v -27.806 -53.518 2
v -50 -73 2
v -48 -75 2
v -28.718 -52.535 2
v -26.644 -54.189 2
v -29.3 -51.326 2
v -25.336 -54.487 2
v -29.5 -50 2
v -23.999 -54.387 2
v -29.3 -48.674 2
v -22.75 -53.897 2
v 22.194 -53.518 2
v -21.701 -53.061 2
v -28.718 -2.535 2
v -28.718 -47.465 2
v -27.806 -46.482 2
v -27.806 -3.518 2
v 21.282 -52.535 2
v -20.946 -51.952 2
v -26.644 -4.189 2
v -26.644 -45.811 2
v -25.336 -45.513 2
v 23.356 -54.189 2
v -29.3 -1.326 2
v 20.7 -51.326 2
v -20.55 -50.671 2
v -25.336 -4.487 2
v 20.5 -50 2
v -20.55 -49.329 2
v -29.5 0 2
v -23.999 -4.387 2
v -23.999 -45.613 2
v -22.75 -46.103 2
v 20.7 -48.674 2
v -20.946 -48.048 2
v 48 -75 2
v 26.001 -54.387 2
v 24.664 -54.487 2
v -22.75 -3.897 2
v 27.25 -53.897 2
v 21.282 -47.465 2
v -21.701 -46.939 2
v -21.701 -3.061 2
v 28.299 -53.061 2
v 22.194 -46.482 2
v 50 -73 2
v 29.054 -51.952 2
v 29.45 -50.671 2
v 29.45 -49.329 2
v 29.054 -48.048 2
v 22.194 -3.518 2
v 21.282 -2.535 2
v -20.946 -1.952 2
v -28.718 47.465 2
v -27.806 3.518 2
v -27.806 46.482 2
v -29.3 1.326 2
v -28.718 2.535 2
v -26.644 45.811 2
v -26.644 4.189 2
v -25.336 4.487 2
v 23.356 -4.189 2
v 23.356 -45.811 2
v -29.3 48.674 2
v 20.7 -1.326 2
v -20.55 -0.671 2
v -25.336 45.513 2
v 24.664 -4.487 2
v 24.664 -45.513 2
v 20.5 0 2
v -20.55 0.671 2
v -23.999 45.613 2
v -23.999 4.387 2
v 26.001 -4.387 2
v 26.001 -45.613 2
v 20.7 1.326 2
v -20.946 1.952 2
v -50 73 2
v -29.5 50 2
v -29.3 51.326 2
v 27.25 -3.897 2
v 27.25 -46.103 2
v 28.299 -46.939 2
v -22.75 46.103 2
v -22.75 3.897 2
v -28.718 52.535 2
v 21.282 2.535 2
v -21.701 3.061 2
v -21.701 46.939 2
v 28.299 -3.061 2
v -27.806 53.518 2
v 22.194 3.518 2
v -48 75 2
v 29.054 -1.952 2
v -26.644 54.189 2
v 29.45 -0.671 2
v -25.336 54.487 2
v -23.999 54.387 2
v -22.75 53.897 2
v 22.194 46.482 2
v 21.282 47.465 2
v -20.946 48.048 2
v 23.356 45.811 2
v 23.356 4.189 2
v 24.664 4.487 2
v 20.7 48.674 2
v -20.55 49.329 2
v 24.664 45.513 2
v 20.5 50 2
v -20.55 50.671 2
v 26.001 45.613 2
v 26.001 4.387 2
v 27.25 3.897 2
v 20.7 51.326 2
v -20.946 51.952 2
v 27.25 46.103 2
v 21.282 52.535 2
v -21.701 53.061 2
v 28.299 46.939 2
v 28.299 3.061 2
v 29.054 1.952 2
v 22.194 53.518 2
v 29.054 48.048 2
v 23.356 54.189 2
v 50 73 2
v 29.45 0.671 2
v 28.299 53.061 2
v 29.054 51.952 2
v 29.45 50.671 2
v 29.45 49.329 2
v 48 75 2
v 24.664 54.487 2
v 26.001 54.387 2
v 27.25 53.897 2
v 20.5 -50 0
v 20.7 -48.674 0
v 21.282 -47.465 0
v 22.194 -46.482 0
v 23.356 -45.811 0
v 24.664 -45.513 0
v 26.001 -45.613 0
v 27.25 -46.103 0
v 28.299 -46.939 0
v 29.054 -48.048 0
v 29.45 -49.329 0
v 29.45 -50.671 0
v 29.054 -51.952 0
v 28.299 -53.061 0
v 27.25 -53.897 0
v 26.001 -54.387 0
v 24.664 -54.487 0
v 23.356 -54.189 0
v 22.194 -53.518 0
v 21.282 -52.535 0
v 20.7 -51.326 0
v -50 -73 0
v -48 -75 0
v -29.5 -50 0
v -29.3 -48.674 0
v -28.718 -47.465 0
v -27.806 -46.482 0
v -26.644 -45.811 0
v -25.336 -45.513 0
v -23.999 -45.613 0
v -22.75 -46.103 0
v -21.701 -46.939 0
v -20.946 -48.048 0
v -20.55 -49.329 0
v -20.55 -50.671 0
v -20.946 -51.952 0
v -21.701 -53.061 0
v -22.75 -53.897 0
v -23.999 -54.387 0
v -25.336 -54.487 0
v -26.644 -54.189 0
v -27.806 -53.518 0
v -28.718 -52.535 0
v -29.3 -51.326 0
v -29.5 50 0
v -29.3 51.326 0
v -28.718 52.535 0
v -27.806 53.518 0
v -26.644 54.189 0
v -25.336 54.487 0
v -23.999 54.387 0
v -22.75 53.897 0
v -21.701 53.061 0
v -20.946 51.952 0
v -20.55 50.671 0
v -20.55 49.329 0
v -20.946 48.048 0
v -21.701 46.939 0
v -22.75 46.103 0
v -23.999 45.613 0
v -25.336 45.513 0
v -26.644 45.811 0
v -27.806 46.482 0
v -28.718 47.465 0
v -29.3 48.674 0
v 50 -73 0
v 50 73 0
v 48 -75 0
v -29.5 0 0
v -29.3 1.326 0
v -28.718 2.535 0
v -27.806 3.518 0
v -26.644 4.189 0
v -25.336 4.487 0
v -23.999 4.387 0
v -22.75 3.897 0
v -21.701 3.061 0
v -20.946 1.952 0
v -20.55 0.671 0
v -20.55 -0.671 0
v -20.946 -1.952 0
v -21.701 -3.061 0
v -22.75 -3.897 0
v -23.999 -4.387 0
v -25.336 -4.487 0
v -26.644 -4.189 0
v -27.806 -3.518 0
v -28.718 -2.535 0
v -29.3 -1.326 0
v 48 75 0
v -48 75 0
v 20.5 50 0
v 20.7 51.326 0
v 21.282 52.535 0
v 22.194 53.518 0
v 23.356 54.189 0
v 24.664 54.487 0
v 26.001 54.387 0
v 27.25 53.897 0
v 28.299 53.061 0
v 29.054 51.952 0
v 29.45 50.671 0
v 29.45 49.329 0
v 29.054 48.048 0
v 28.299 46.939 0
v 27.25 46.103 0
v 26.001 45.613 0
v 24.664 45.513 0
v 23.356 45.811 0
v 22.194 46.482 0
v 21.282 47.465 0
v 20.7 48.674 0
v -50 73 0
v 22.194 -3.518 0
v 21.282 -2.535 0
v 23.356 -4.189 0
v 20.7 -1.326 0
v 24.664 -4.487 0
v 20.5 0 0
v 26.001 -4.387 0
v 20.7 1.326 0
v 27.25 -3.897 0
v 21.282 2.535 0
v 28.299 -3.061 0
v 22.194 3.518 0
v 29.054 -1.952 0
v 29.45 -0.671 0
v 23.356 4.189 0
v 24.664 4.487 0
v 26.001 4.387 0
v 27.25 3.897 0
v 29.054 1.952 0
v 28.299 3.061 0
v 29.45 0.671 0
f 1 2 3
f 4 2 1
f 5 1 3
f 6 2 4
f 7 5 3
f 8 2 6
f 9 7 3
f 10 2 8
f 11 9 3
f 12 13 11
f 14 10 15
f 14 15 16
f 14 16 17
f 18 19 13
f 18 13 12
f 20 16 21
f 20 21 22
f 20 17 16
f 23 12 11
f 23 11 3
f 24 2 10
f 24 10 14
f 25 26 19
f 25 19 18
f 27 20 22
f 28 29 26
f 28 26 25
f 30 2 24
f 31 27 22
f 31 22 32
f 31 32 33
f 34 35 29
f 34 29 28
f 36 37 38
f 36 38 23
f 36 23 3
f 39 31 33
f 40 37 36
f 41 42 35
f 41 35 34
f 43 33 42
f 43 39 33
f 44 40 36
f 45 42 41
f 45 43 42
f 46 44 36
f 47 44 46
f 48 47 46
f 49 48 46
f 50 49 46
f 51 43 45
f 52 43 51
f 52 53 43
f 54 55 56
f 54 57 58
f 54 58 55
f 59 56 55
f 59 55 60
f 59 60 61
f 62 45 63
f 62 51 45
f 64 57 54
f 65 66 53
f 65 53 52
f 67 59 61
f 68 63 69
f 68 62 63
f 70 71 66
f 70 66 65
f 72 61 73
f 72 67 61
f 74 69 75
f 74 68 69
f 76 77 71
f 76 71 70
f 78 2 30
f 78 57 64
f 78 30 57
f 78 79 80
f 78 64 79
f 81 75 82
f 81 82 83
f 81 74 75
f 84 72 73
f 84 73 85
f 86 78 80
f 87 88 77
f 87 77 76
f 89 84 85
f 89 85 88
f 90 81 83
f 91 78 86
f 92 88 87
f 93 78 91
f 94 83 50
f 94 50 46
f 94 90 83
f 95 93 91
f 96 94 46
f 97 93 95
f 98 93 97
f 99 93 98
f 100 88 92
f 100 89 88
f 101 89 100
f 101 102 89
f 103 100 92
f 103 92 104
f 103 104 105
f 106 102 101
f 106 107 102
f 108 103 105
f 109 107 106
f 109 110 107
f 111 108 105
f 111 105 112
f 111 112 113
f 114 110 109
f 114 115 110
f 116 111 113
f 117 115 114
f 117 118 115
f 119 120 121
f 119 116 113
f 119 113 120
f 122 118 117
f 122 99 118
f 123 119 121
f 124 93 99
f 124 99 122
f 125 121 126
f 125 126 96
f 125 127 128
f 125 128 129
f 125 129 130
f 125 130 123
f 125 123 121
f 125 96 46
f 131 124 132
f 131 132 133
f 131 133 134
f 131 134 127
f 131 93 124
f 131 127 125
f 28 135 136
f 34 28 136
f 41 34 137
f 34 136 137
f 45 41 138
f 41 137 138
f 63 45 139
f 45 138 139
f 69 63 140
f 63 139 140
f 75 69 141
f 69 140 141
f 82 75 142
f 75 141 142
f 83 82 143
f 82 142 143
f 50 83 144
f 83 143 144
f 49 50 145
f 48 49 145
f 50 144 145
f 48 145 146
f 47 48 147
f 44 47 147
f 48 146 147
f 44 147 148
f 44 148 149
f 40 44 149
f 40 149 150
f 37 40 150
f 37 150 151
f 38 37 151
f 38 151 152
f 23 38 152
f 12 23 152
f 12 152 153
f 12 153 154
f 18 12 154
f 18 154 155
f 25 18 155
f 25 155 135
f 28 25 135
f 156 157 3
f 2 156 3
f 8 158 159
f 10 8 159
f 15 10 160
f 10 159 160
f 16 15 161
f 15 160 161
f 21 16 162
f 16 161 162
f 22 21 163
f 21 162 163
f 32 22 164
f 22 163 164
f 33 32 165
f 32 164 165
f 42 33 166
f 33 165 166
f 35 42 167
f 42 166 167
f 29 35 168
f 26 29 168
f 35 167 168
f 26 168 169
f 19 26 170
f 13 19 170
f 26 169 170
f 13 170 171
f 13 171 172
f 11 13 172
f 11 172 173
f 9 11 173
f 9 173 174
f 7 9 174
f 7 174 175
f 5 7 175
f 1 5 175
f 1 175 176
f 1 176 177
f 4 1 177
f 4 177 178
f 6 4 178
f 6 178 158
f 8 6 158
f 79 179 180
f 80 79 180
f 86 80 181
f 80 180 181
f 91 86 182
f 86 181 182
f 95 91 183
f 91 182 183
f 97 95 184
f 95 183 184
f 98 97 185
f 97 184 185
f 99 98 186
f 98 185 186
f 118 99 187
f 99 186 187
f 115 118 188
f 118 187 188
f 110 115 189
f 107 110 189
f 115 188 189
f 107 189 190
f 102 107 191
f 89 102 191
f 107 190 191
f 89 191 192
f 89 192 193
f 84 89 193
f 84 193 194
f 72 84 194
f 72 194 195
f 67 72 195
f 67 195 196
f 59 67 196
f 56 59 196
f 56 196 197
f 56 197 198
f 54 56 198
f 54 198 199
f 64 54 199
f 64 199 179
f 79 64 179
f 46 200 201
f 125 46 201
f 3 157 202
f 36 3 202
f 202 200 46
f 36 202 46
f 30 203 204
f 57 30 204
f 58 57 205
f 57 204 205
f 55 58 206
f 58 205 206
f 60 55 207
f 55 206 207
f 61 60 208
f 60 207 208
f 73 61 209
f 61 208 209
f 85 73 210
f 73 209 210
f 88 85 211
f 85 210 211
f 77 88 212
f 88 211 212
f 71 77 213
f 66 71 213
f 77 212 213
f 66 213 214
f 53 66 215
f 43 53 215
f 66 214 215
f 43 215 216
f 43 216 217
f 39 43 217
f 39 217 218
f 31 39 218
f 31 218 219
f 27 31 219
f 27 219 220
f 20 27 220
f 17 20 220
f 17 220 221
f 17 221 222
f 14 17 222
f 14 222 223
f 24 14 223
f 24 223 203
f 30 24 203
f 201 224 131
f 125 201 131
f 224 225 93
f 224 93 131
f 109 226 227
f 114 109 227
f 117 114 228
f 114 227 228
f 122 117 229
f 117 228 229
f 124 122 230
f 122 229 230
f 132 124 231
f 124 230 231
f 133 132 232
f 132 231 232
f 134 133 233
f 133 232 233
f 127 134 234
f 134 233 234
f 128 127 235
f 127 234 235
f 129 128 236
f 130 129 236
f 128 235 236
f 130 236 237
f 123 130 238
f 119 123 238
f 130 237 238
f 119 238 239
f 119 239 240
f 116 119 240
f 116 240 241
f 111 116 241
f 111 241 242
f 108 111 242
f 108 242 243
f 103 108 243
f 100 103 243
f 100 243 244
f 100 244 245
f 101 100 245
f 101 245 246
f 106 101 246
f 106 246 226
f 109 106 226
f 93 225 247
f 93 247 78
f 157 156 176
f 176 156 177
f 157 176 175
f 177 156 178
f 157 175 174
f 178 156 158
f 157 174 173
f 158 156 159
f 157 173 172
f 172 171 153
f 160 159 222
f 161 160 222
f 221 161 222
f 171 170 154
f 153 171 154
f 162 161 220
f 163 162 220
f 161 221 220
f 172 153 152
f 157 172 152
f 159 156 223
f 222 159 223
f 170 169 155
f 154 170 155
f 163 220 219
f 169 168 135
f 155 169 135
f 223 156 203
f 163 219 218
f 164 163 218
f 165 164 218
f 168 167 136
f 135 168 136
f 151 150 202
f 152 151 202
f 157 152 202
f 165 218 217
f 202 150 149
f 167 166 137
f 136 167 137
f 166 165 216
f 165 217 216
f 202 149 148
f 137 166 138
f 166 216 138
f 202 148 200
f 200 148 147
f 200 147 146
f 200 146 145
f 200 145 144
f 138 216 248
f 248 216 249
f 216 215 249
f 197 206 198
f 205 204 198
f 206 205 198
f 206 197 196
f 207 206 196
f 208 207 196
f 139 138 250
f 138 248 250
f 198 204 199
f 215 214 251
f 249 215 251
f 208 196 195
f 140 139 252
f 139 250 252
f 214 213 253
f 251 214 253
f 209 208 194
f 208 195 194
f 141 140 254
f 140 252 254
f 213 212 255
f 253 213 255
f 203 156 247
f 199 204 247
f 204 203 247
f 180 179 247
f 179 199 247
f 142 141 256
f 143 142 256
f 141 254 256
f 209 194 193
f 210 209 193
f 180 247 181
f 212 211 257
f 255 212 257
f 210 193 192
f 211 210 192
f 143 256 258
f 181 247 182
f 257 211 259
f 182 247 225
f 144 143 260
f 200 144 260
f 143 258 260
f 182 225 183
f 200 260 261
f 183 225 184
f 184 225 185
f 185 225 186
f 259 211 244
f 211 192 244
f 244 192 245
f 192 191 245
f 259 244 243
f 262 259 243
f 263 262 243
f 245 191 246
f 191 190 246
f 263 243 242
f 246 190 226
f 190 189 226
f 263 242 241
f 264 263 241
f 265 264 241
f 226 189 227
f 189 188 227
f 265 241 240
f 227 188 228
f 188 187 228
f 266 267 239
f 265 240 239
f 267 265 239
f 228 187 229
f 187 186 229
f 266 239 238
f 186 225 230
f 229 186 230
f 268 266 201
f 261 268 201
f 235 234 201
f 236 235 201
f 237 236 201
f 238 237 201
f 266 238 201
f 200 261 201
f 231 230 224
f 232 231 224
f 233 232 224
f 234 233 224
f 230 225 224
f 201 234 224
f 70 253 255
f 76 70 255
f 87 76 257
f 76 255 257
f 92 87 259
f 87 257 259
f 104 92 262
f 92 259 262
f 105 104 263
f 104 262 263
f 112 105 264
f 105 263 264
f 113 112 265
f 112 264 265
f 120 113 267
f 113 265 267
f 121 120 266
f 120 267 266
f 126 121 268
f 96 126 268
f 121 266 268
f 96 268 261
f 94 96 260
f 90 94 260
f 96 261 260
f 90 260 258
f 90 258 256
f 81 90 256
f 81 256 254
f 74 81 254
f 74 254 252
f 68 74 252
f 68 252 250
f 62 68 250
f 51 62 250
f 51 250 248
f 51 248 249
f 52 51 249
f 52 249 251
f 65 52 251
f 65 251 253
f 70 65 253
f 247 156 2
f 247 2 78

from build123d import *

# Parameters (mm, degrees)
SKETCH_1_W        = 100
SKETCH_1_H        = 150
EXTRUDE_1_DEPTH   = 2
CHAMFER_1_SIZE    = 2
HOLE_WIZARD_M81_D = 9


with BuildPart() as part:
    # Эскиз1 → Бобышка-Вытянуть1 (new body)
    with BuildSketch(Plane.XY):
        Rectangle(SKETCH_1_W, SKETCH_1_H)
    extrude(amount=EXTRUDE_1_DEPTH)

    # Фаска1
    chamfer_1_edges = [part.edges().sort_by_distance(p)[0] for p in [
        (50, -75, 1),
        (-50, -75, 1),
        (-50, 75, 1),
        (50, 75, 1),
    ]]
    chamfer(chamfer_1_edges, length=CHAMFER_1_SIZE)

    # Отверстие с зазором M81 (through all)
    with Locations(Plane.XY.offset(2)):
        with Locations((-25, 50), (25, 50), (25, 0), (-25, 0), (-25, -50), (25, -50)):
            Hole(HOLE_WIZARD_M81_D / 2)


solid = part.part
